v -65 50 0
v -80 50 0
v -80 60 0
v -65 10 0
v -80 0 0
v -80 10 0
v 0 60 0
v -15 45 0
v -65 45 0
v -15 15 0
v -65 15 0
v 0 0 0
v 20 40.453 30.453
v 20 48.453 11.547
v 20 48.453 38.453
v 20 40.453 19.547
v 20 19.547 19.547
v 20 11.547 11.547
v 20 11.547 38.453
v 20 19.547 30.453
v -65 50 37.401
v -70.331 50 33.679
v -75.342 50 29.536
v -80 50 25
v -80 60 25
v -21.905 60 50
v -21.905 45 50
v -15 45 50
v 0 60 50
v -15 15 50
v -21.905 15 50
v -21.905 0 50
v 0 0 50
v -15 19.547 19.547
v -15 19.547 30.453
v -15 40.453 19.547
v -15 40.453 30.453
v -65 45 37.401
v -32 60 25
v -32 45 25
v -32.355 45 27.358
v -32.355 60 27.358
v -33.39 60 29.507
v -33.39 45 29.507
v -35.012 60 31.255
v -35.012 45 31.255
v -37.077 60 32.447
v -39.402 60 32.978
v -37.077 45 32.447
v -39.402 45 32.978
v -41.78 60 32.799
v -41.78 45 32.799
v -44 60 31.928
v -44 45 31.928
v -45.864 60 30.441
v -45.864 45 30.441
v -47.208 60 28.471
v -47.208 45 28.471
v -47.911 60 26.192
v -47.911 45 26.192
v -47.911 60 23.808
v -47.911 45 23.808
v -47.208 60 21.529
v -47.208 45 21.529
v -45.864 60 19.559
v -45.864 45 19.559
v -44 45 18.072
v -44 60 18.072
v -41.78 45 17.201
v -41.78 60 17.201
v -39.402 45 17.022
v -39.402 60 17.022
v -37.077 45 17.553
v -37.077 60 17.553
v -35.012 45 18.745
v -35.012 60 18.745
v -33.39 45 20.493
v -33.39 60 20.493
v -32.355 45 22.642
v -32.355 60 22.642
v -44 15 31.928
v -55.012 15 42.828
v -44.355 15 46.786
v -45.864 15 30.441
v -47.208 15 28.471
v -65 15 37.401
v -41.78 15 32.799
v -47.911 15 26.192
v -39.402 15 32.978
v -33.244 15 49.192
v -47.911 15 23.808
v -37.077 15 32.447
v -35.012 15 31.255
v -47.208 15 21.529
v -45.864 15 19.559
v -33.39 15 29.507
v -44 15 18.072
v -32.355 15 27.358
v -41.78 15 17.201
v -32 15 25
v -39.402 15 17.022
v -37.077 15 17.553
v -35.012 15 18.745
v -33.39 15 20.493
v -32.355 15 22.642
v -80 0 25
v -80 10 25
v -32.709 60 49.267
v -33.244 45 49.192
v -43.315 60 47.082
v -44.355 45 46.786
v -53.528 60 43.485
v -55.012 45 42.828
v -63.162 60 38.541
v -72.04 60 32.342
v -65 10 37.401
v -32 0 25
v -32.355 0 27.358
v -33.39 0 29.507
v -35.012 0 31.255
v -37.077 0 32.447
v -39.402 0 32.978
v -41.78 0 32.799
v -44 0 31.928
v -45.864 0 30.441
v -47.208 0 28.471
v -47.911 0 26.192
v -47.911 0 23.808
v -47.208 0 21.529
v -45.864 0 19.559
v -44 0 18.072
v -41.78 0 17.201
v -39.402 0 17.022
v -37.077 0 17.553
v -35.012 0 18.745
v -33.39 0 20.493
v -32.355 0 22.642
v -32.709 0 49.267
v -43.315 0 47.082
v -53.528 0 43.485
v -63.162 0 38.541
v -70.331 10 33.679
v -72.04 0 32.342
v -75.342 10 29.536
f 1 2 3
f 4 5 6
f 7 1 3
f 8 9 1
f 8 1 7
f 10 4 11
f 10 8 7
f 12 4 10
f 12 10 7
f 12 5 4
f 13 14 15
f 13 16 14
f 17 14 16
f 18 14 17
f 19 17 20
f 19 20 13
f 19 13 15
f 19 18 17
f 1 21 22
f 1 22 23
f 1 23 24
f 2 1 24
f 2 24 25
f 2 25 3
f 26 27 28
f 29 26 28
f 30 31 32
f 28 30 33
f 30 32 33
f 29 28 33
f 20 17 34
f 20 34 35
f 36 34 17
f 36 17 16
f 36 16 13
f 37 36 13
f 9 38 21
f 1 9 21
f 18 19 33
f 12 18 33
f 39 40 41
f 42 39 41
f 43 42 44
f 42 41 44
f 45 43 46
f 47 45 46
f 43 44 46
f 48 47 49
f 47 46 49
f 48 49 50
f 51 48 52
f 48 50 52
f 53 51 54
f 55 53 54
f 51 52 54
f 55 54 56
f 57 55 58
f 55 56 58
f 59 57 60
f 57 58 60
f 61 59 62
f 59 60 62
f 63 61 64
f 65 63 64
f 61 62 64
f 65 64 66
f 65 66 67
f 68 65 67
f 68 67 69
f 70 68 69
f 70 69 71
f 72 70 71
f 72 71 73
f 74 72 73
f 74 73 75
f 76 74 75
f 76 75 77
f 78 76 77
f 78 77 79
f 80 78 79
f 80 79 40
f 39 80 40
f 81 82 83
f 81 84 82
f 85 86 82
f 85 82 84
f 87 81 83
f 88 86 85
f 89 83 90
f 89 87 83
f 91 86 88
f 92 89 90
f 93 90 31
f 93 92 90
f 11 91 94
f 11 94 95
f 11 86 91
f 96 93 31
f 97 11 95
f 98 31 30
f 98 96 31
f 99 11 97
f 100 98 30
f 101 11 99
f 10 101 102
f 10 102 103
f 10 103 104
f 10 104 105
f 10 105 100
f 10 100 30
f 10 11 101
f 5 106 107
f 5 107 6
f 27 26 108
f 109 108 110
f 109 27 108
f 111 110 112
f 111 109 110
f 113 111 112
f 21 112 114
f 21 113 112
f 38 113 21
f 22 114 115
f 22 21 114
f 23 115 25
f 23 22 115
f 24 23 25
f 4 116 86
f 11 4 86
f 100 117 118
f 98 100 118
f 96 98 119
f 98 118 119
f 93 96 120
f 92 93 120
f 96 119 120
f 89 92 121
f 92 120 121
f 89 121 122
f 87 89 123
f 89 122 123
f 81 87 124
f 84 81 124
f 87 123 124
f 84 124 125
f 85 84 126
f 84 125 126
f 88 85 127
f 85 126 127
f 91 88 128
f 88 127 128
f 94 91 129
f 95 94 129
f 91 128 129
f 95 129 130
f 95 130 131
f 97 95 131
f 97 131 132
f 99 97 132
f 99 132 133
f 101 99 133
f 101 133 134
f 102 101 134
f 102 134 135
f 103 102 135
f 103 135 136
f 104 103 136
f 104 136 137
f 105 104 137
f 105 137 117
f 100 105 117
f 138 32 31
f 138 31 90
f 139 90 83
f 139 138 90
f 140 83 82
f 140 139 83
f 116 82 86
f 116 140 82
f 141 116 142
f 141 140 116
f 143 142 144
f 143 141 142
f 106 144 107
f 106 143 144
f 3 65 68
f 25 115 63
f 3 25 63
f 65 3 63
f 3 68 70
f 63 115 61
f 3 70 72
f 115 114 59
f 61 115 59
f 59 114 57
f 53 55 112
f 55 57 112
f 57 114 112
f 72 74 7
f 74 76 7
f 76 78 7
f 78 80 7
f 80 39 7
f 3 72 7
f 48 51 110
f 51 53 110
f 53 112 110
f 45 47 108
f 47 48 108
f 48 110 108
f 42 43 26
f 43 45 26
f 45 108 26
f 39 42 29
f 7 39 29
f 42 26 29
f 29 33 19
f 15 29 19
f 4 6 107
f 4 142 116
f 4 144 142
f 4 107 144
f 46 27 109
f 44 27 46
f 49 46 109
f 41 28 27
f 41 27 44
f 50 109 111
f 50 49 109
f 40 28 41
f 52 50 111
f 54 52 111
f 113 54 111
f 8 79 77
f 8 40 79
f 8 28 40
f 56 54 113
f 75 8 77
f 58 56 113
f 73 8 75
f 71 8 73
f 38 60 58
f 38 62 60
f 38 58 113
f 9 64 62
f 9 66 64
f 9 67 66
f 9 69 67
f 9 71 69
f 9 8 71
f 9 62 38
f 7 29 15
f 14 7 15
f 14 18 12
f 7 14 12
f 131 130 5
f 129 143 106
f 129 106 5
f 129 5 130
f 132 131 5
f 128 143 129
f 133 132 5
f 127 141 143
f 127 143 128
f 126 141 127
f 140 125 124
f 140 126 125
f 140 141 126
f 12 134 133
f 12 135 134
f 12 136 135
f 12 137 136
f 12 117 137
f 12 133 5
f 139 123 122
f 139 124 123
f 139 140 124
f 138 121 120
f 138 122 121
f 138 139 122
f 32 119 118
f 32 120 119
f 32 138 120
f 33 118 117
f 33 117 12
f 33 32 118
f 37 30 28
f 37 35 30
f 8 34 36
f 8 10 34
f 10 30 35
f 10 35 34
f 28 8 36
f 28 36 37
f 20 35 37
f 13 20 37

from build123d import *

# Parameters (mm, degrees)
F0_R      = 8
F1_DEPTH  = 60
F3_DEPTH  = 50.001
F4_W      = 20
F4_H      = 50
F5_DEPTH  = 60
F7_DEPTH  = 60.001
F9_DEPTH  = 50.001
F13_DEPTH = 50.001
F11_W     = 20.90599
F11_H     = 10.90599
F12_DEPTH = 100.001


with BuildPart() as f1:
    # F0 (on Front) → F1 (new body)
    with BuildSketch(Plane.XZ):
        with BuildLine():
            Line((-80, 0), (0, 0))
            Line((0, 0), (0, 50))
            Line((0, 50), (-21.90525, 50))
            ThreePointArc((-21.90525, 50), (-53.528026, 43.484692), (-80, 25))
            Line((-80, 25), (-80, 0))
        make_face()
        with Locations((-40, 25)):
            Circle(F0_R, mode=Mode.SUBTRACT)
    extrude(amount=-F1_DEPTH)

    # F2 (on Top) → F3 (cut, through all)
    with BuildSketch(Plane.XY):
        Polygon((-15, 30), (-80, 30), (-80, 10), (-65, 10), (-65, 15), (-15, 15), align=None)
        Polygon((-80, 50), (-80, 30), (-15, 30), (-15, 45), (-65, 45), (-65, 50), align=None)
    extrude(amount=F3_DEPTH, mode=Mode.SUBTRACT)

    # F4 (on Front) → F5 (join)
    with BuildSketch(Plane.XZ):
        with Locations((10, 25)):
            Rectangle(F4_W, F4_H)
    extrude(amount=-F5_DEPTH)

    # F6 (on Front) → F7 (cut, through all)
    with BuildSketch(Plane.XZ):
        Polygon((20, 50), (0, 50), (20, 38.452995), align=None)
        Polygon((20, 11.547005), (0, 0), (20, 0), align=None)
    extrude(amount=-F7_DEPTH, mode=Mode.SUBTRACT)

    # F8 (on face) → F9 (cut, through all)
    with BuildSketch(Plane.XY.offset(50)):
        Polygon((20, 11.547005), (0, 0), (20, 0), align=None)
        Polygon((20, 60), (0, 60), (20, 48.452995), align=None)
    extrude(amount=-F9_DEPTH, mode=Mode.SUBTRACT)

    # F10 (on Top) → F13 (cut, through all)
    with BuildSketch(Plane.XY):
        Polygon((20, 11.547005), (0, 0), (20, 0), align=None)
        Polygon((20, 60), (0, 60), (20, 48.452995), align=None)
    extrude(amount=F13_DEPTH, mode=Mode.SUBTRACT)

    # F11 (on face) → F12 (cut, through all)
    with BuildSketch(Plane.YZ.offset(20)):
        with Locations((30, 25)):
            Rectangle(F11_W, F11_H)
    extrude(amount=-F12_DEPTH, mode=Mode.SUBTRACT)


solid = f1.part
